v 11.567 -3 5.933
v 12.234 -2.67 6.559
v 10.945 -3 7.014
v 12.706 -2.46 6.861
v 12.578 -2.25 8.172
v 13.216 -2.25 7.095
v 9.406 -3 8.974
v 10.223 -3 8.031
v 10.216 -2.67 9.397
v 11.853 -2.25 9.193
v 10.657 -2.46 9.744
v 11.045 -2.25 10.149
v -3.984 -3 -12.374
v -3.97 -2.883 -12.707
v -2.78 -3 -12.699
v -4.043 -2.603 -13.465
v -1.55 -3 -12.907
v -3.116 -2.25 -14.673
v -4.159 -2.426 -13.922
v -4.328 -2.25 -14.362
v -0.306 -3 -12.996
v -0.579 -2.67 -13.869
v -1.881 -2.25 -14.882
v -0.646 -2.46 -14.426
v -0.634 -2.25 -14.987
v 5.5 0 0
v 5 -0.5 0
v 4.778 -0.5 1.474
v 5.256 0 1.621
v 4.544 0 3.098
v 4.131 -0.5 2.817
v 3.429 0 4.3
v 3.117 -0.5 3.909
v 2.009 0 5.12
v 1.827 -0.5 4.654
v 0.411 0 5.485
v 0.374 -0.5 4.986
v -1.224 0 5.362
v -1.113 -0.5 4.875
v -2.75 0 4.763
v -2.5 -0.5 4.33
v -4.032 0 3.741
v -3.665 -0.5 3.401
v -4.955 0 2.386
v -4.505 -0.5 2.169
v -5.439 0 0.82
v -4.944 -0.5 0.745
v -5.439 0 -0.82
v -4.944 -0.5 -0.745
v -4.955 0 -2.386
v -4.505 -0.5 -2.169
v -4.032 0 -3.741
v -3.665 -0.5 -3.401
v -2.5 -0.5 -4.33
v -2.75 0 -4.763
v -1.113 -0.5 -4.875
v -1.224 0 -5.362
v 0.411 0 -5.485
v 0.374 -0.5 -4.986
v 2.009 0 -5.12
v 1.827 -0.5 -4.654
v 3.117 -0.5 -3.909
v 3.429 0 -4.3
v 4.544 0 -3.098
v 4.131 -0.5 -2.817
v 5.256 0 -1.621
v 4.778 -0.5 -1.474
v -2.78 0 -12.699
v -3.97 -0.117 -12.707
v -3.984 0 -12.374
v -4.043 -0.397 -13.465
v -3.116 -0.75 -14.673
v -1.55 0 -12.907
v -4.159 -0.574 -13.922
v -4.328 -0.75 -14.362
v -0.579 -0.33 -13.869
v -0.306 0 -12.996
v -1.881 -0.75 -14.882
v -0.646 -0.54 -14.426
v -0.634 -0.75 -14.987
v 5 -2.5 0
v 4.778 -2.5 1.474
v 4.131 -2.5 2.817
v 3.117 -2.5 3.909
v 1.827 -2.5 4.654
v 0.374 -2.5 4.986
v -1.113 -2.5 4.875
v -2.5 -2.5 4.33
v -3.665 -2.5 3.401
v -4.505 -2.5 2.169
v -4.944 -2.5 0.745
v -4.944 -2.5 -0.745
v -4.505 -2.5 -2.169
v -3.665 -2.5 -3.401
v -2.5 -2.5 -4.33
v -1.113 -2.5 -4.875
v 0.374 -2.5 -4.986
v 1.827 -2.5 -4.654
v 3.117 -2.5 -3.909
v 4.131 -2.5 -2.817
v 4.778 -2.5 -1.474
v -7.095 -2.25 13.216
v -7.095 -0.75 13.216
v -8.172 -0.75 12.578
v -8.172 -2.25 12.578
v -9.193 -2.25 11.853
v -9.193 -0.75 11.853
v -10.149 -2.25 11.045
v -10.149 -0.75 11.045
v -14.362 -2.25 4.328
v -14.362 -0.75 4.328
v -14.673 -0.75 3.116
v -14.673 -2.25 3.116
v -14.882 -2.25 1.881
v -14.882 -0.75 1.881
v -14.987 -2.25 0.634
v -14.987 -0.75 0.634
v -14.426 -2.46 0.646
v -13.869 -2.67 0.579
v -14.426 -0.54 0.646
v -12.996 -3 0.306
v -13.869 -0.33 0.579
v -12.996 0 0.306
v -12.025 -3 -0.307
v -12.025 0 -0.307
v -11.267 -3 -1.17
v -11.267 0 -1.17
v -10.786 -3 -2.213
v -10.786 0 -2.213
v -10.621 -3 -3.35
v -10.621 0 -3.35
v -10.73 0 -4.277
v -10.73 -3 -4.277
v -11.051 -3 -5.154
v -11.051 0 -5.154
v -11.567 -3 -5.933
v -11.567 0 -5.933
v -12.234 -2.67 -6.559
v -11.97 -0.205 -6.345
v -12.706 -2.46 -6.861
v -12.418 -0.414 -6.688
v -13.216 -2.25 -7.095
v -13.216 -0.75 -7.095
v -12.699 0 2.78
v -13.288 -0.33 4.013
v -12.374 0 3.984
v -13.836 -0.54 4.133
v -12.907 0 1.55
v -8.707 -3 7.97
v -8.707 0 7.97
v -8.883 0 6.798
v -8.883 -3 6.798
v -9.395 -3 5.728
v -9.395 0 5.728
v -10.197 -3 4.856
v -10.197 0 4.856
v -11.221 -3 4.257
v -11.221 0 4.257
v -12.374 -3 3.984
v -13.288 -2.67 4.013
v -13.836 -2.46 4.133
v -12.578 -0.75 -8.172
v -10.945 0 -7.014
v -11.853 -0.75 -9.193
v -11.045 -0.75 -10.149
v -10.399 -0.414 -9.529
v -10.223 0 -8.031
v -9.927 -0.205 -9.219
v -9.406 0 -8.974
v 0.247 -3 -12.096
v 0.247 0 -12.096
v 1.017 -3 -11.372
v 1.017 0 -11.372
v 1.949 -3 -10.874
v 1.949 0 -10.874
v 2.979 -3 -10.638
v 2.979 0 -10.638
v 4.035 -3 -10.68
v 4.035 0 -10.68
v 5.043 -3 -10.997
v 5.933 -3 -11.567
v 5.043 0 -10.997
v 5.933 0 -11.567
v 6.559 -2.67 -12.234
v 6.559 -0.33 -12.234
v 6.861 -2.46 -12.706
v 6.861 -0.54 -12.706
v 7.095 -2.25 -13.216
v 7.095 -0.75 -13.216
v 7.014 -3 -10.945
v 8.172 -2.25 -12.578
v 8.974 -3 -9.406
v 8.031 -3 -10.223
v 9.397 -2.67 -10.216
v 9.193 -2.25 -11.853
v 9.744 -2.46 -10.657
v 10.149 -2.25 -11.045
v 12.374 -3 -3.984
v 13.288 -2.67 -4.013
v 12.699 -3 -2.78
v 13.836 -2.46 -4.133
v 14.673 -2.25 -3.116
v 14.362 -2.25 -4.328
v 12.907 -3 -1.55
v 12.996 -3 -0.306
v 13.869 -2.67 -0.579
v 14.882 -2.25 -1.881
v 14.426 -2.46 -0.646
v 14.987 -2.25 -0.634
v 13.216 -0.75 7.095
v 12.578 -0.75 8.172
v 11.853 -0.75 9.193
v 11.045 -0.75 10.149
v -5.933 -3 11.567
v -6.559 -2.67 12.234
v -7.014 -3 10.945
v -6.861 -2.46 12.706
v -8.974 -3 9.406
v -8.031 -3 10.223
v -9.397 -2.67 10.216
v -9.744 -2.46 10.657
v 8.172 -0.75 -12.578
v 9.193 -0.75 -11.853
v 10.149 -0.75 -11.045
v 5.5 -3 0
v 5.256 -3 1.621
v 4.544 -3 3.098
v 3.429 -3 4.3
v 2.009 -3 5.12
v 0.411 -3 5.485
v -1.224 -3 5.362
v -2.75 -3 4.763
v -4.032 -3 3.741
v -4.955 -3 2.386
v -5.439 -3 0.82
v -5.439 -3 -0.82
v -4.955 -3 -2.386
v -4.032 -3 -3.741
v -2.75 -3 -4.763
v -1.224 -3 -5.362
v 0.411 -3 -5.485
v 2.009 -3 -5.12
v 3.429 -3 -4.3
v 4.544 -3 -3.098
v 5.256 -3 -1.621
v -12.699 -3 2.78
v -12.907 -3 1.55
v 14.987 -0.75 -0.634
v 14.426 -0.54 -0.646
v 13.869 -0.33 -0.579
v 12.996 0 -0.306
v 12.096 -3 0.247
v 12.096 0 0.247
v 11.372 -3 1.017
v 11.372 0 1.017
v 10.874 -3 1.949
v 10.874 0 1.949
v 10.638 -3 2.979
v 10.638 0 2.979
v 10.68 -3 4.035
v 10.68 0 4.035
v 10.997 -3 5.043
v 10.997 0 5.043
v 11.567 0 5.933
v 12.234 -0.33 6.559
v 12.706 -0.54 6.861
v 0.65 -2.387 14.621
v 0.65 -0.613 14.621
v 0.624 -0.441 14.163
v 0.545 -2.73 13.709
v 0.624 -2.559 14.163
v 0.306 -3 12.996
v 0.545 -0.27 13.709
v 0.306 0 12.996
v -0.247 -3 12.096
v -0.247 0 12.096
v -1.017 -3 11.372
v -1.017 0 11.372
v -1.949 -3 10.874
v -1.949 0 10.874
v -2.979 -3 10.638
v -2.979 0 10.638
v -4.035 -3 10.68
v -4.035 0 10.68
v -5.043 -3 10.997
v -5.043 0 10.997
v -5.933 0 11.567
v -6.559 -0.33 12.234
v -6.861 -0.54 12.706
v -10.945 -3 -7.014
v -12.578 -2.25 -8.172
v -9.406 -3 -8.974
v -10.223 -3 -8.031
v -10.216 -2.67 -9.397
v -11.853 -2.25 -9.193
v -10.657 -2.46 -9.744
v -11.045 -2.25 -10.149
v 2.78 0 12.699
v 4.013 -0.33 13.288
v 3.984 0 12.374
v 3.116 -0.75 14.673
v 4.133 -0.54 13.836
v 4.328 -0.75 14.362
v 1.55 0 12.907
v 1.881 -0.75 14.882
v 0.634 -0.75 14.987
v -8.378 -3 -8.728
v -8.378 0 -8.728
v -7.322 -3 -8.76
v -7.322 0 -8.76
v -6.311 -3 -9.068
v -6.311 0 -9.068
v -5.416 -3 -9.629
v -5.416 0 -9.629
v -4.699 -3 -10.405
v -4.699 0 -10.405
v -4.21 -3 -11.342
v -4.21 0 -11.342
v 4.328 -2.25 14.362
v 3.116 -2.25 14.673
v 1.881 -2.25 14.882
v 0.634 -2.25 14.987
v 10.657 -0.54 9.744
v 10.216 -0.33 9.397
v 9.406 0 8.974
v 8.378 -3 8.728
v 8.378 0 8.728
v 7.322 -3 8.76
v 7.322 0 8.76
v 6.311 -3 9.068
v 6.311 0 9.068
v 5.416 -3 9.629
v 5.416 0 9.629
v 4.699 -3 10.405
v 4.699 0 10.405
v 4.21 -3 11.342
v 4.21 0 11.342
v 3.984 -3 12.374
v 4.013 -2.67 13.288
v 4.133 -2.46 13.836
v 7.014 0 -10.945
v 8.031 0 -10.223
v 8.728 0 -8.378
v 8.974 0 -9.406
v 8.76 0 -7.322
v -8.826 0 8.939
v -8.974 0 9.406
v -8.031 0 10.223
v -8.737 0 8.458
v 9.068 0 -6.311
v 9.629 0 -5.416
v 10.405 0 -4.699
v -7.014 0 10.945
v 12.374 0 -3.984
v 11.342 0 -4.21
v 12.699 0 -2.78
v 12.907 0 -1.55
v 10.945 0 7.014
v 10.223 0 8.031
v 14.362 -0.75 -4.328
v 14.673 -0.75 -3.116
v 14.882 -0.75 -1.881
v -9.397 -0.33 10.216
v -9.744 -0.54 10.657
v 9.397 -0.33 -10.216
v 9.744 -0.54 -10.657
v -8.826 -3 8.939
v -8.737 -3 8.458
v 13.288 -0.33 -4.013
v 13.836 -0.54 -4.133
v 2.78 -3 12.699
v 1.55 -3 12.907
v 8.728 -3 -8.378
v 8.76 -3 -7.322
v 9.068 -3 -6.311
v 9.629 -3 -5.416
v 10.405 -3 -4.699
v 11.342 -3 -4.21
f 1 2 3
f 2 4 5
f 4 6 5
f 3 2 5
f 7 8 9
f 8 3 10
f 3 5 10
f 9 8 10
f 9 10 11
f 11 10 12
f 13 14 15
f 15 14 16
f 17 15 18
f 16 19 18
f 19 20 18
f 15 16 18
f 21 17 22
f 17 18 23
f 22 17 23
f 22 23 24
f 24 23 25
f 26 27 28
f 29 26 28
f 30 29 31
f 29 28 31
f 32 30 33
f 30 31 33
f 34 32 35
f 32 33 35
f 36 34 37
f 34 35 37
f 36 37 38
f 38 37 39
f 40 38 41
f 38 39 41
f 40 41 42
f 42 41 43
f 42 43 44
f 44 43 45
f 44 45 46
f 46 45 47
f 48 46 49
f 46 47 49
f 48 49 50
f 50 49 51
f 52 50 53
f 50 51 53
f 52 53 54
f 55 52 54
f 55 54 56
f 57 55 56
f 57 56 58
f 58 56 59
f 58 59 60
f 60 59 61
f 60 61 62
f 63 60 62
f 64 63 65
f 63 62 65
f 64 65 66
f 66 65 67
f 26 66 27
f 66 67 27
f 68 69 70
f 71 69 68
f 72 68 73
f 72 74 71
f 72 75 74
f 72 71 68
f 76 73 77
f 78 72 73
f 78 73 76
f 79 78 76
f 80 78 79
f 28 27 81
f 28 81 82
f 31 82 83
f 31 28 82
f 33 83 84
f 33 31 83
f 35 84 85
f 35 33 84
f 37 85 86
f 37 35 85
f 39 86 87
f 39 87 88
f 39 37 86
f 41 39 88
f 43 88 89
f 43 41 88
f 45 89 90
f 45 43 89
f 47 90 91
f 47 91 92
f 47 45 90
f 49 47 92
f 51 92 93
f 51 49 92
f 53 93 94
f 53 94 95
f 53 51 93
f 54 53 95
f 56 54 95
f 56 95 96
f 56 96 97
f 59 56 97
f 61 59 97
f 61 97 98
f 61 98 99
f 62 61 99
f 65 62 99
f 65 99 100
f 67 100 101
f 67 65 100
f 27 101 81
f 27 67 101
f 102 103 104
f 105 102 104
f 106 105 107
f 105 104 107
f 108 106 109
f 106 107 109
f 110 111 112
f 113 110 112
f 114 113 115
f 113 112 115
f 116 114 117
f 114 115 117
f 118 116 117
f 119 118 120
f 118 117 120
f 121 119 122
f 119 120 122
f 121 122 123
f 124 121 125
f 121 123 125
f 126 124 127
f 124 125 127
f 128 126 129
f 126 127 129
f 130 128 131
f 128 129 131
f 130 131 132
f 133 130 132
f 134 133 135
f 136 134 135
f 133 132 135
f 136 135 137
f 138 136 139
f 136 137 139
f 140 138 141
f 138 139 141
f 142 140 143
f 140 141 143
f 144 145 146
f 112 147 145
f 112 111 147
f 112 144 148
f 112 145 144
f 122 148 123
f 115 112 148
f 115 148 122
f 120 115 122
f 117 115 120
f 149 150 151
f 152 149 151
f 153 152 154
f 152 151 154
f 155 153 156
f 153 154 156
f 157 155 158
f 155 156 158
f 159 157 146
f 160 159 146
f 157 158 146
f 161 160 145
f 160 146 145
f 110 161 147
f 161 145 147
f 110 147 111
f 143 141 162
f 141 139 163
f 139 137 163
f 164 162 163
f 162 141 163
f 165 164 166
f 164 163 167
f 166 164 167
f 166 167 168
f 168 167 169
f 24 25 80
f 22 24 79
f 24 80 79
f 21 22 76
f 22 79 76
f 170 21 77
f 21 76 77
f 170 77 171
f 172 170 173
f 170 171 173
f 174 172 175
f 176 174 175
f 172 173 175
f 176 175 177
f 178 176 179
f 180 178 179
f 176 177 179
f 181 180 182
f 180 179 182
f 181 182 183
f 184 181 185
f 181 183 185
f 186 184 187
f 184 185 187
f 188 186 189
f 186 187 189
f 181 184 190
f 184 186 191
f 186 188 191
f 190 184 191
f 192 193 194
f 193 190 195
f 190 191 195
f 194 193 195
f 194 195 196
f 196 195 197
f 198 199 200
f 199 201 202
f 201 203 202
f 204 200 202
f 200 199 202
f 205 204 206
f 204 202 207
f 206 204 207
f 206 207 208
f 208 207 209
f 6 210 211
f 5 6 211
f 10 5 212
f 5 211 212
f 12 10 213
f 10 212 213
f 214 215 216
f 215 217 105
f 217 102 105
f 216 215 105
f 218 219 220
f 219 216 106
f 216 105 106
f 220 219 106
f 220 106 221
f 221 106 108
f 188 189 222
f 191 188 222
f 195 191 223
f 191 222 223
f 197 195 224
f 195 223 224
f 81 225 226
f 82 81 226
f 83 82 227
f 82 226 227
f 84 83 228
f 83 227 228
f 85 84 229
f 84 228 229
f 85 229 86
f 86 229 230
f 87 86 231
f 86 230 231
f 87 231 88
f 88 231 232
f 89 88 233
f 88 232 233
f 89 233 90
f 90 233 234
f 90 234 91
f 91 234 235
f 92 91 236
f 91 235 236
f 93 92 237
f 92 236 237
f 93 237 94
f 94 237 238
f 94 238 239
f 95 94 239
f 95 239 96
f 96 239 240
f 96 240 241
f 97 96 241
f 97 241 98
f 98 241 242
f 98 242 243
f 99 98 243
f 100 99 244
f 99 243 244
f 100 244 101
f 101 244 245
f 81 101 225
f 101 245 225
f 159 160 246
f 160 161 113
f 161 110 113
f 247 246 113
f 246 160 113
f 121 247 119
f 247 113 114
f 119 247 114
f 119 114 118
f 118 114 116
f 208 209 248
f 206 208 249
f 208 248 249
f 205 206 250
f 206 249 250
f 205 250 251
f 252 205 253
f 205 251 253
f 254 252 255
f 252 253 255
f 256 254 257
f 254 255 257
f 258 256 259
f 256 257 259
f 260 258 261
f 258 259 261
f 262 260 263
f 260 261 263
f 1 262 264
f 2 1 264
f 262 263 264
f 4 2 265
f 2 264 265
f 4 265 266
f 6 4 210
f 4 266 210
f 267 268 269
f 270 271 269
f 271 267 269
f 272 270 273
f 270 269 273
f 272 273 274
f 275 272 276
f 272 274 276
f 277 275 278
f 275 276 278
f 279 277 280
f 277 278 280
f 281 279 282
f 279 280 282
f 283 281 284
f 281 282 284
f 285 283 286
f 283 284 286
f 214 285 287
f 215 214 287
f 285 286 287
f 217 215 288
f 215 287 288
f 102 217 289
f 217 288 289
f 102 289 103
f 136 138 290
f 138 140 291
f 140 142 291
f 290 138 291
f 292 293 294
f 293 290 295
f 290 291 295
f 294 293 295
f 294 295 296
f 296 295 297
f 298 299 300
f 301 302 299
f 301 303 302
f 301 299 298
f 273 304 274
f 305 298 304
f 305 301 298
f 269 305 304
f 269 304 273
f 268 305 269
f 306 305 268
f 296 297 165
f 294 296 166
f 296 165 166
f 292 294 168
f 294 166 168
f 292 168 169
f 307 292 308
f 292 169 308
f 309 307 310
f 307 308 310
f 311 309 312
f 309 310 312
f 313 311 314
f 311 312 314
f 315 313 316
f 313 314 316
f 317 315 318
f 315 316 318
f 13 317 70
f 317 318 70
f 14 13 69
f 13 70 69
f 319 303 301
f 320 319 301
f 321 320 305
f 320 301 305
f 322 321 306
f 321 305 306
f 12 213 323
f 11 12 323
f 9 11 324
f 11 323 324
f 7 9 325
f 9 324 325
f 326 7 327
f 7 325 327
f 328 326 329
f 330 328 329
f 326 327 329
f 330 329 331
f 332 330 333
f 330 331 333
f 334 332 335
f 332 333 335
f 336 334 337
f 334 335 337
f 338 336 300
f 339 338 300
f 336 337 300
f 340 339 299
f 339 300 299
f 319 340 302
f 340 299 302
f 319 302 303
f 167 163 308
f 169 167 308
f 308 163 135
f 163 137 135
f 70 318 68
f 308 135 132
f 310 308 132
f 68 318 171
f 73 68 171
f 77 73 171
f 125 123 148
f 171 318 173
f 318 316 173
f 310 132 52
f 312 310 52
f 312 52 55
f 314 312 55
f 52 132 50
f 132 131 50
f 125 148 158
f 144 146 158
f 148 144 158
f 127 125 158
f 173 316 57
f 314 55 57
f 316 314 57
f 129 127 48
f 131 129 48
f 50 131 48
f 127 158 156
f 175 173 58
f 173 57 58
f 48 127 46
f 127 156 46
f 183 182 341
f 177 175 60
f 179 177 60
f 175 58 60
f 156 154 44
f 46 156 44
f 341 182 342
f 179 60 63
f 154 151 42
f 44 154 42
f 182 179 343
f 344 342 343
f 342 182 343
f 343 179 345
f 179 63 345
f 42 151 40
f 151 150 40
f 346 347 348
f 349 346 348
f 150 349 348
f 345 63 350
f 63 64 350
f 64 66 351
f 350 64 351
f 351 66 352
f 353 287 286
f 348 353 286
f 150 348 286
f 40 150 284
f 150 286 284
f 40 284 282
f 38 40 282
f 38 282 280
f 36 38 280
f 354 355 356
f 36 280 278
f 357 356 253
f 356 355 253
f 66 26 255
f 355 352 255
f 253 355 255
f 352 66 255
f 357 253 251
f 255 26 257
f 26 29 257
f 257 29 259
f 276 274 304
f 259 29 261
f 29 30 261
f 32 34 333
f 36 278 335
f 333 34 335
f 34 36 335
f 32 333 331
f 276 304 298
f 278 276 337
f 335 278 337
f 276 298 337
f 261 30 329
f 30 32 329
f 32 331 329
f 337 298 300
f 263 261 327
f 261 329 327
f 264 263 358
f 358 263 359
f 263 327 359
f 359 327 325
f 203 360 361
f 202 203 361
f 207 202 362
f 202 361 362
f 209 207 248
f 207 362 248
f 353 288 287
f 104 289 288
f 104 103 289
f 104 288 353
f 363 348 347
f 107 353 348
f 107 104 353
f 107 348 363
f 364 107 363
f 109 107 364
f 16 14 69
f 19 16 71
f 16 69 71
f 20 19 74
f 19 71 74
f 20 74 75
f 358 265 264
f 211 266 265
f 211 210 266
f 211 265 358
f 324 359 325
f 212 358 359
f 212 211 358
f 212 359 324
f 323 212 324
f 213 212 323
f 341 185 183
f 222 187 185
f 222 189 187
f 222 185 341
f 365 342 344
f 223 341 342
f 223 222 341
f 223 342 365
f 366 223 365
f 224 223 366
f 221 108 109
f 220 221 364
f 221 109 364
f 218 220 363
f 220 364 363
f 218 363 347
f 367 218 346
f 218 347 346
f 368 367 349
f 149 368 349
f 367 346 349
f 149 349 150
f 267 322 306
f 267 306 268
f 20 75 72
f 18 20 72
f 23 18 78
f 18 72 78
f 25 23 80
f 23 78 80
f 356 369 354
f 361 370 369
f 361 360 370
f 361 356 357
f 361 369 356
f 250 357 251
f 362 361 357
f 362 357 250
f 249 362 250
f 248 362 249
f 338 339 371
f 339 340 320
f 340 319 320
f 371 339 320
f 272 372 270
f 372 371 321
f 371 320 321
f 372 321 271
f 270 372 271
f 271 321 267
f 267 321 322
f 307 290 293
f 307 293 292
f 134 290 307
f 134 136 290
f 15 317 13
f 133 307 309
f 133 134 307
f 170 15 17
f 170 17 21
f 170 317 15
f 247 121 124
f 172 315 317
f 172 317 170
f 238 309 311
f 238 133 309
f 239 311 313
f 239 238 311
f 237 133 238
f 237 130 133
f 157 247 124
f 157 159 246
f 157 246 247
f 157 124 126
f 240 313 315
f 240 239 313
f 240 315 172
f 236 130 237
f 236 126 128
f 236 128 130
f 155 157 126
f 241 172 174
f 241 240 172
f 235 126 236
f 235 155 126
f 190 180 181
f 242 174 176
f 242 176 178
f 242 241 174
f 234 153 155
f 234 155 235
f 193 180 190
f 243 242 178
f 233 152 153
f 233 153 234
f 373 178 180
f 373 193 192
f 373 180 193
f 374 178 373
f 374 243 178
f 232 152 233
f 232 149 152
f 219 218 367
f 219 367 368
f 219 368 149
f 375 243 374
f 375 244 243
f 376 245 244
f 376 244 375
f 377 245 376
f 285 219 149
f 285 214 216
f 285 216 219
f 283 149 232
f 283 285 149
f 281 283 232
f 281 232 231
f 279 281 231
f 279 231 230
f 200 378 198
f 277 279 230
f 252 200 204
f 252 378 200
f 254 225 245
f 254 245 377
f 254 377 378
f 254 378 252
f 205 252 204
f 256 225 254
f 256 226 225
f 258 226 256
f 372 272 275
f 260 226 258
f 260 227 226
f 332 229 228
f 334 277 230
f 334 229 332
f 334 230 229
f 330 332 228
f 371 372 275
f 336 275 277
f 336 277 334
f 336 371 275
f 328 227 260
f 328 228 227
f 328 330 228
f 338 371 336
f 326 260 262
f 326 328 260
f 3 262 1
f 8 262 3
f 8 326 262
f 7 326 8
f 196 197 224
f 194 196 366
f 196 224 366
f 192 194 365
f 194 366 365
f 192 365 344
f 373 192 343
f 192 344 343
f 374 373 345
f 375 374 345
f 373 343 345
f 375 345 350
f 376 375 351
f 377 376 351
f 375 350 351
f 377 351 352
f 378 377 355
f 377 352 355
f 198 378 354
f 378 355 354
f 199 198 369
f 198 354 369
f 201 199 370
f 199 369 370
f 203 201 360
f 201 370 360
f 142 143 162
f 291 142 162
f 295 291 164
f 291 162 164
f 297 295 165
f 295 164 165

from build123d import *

# Parameters (mm, degrees)
F0_R         = 5
F1_DEPTH     = 3
F2_C1_SIZE2  = 0.75
F2_C1_SIZE   = 2
F2_C2_SIZE2  = 0.75
F2_C2_SIZE   = 2
F2_C3_SIZE2  = 0.75
F2_C3_SIZE   = 2
F2_C4_SIZE2  = 0.75
F2_C4_SIZE   = 2
F2_C5_SIZE2  = 0.75
F2_C5_SIZE   = 2
F2_C6_SIZE2  = 0.75
F2_C6_SIZE   = 2
F2_C7_SIZE2  = 0.75
F2_C7_SIZE   = 2
F2_C8_SIZE2  = 0.75
F2_C8_SIZE   = 2
F2_C9_SIZE2  = 2
F2_C9_SIZE   = 0.75
F2_C10_SIZE2 = 0.75
F2_C10_SIZE  = 2
F2_C11_SIZE2 = 0.75
F2_C11_SIZE  = 2
F2_C12_SIZE2 = 0.75
F2_C12_SIZE  = 2
F2_C13_SIZE2 = 0.75
F2_C13_SIZE  = 2
F2_C14_SIZE2 = 0.75
F2_C14_SIZE  = 2
F2_C15_SIZE2 = 0.75
F2_C15_SIZE  = 2
F2_C16_SIZE2 = 0.75
F2_C16_SIZE  = 2
F4_SIZE      = 0.5


# Not quite as in the source:
# - two fillets or chamfers of one size are made in one step


with BuildPart() as f1:
    # F0 (on Front) → F1 (new body)
    with BuildSketch(Plane.XZ):
        with BuildLine():
            ThreePointArc((14.98661002, -0.6336561441), (10.7222272749, 2.4563880526), (13.2160968729, 7.0947010823))
            ThreePointArc((13.2160968729, 7.0947010823), (12.2264008787, 8.6899437025), (11.0451961285, 10.1490710157))
            ThreePointArc((11.0451961285, 10.1490710157), (5.8448309663, 9.3186882647), (4.3284804738, 14.3619029654))
            ThreePointArc((4.3284804738, 14.3619029654), (2.5006528507, 14.790089091), (0.6336561441, 14.98661002))
            ThreePointArc((0.6336561441, 14.98661002), (0.6461967949, 14.8041057756), (0.6503799283, 14.6212190113))
            ThreePointArc((0.6503799283, 14.6212190113), (-2.6355906754, 10.6854646971), (-7.0947010823, 13.2160968729))
            ThreePointArc((-7.0947010823, 13.2160968729), (-8.6899437025, 12.2264008787), (-10.1490710157, 11.0451961285))
            ThreePointArc((-10.1490710157, 11.0451961285), (-9.0856364951, 9.6683222969), (-8.7073021792, 7.970224045))
            ThreePointArc((-8.7073021792, 7.970224045), (-10.5414770644, 4.6073084094), (-14.3619029654, 4.3284804738))
            ThreePointArc((-14.3619029654, 4.3284804738), (-14.790089091, 2.5006528507), (-14.98661002, 0.6336561441))
            ThreePointArc((-14.98661002, 0.6336561441), (-11.9250702797, -0.3948303977), (-10.6212190113, -3.3496200717))
            ThreePointArc((-10.6212190113, -3.3496200717), (-11.3333254186, -5.6277236082), (-13.2160968729, -7.0947010823))
            ThreePointArc((-13.2160968729, -7.0947010823), (-12.2264008787, -8.6899437025), (-11.0451961285, -10.1490710157))
            ThreePointArc((-11.0451961285, -10.1490710157), (-6.6100564697, -8.9456610257), (-3.970224045, -12.7073021792))
            ThreePointArc((-3.970224045, -12.7073021792), (-4.060813969, -13.5537730042), (-4.3284804738, -14.3619029654))
            ThreePointArc((-4.3284804738, -14.3619029654), (-2.5006528507, -14.790089091), (-0.6336561441, -14.98661002))
            ThreePointArc((-0.6336561441, -14.98661002), (2.4563880526, -10.7222272749), (7.0947010823, -13.2160968729))
            ThreePointArc((7.0947010823, -13.2160968729), (8.6899437025, -12.2264008787), (10.1490710157, -11.0451961285))
            ThreePointArc((10.1490710157, -11.0451961285), (9.3186882647, -5.8448309663), (14.3619029654, -4.3284804738))
            ThreePointArc((14.3619029654, -4.3284804738), (14.790089091, -2.5006528507), (14.98661002, -0.6336561441))
        make_face()
        Circle(F0_R, mode=Mode.SUBTRACT)
    extrude(amount=F1_DEPTH)

    # F2: chamfer of 2 x 0.75 on 16 edges, made by hand

    # F2_c1
    f2_c1_edges = [f1.edges().sort_by_distance(p)[0] for p in [
        (8.6899437025, -3, -12.2264008787),
    ]]
    f2_c1_side = f1.faces().sort_by_distance((8.6812537588, -3, -12.2141744779))[0]
    chamfer(f2_c1_edges, length=F2_C1_SIZE, length2=F2_C1_SIZE2, reference=f2_c1_side)

    # F2_c2
    f2_c2_edges = [f1.edges().sort_by_distance(p)[0] for p in [
        (14.790089091, -3, -2.5006528507),
    ]]
    f2_c2_side = f1.faces().sort_by_distance((14.7752990019, -3, -2.4981521978))[0]
    chamfer(f2_c2_edges, length=F2_C2_SIZE, length2=F2_C2_SIZE2, reference=f2_c2_side)

    # F2_c3
    f2_c3_edges = [f1.edges().sort_by_distance(p)[0] for p in [
        (12.2264008787, -3, 8.6899437025),
    ]]
    f2_c3_side = f1.faces().sort_by_distance((12.2141744779, -3, 8.6812537588))[0]
    chamfer(f2_c3_edges, length=F2_C3_SIZE, length2=F2_C3_SIZE2, reference=f2_c3_side)

    # F2_c4
    f2_c4_edges = [f1.edges().sort_by_distance(p)[0] for p in [
        (2.5006528507, -3, 14.790089091),
    ]]
    f2_c4_side = f1.faces().sort_by_distance((2.4981521978, -3, 14.7752990019))[0]
    chamfer(f2_c4_edges, length=F2_C4_SIZE, length2=F2_C4_SIZE2, reference=f2_c4_side)

    # F2_c5
    f2_c5_edges = [f1.edges().sort_by_distance(p)[0] for p in [
        (-8.6899437025, -3, 12.2264008787),
    ]]
    f2_c5_side = f1.faces().sort_by_distance((-8.6812537588, -3, 12.2141744779))[0]
    chamfer(f2_c5_edges, length=F2_C5_SIZE, length2=F2_C5_SIZE2, reference=f2_c5_side)

    # F2_c6
    f2_c6_edges = [f1.edges().sort_by_distance(p)[0] for p in [
        (-14.790089091, -3, 2.5006528507),
    ]]
    f2_c6_side = f1.faces().sort_by_distance((-14.7752990019, -3, 2.4981521978))[0]
    chamfer(f2_c6_edges, length=F2_C6_SIZE, length2=F2_C6_SIZE2, reference=f2_c6_side)

    # F2_c7
    f2_c7_edges = [f1.edges().sort_by_distance(p)[0] for p in [
        (-12.2264008787, -3, -8.6899437025),
    ]]
    f2_c7_side = f1.faces().sort_by_distance((-12.2141744779, -3, -8.6812537588))[0]
    chamfer(f2_c7_edges, length=F2_C7_SIZE, length2=F2_C7_SIZE2, reference=f2_c7_side)

    # F2_c8
    f2_c8_edges = [f1.edges().sort_by_distance(p)[0] for p in [
        (-2.5006528507, -3, -14.790089091),
    ]]
    f2_c8_side = f1.faces().sort_by_distance((-2.4981521978, -3, -14.7752990019))[0]
    chamfer(f2_c8_edges, length=F2_C8_SIZE, length2=F2_C8_SIZE2, reference=f2_c8_side)

    # F2_c9
    f2_c9_edges = [f1.edges().sort_by_distance(p)[0] for p in [
        (-12.2264008787, 0, -8.6899437025),
    ]]
    f2_c9_side = f1.faces().sort_by_distance((-12.2264008787, -0.015, -8.6899437025))[0]
    chamfer(f2_c9_edges, length=F2_C9_SIZE, length2=F2_C9_SIZE2, reference=f2_c9_side)

    # F2_c10
    f2_c10_edges = [f1.edges().sort_by_distance(p)[0] for p in [
        (-14.790089091, 0, 2.5006528507),
    ]]
    f2_c10_side = f1.faces().sort_by_distance((-14.7752990019, 0, 2.4981521978))[0]
    chamfer(f2_c10_edges, length=F2_C10_SIZE, length2=F2_C10_SIZE2, reference=f2_c10_side)

    # F2_c11
    f2_c11_edges = [f1.edges().sort_by_distance(p)[0] for p in [
        (-8.6899437025, 0, 12.2264008787),
    ]]
    f2_c11_side = f1.faces().sort_by_distance((-8.6812537588, 0, 12.2141744779))[0]
    chamfer(f2_c11_edges, length=F2_C11_SIZE, length2=F2_C11_SIZE2, reference=f2_c11_side)

    # F2_c12
    f2_c12_edges = [f1.edges().sort_by_distance(p)[0] for p in [
        (2.5006528507, 0, 14.790089091),
    ]]
    f2_c12_side = f1.faces().sort_by_distance((2.4981521978, 0, 14.7752990019))[0]
    chamfer(f2_c12_edges, length=F2_C12_SIZE, length2=F2_C12_SIZE2, reference=f2_c12_side)

    # F2_c13
    f2_c13_edges = [f1.edges().sort_by_distance(p)[0] for p in [
        (12.2264008787, 0, 8.6899437025),
    ]]
    f2_c13_side = f1.faces().sort_by_distance((12.2141744779, 0, 8.6812537588))[0]
    chamfer(f2_c13_edges, length=F2_C13_SIZE, length2=F2_C13_SIZE2, reference=f2_c13_side)

    # F2_c14
    f2_c14_edges = [f1.edges().sort_by_distance(p)[0] for p in [
        (14.790089091, 0, -2.5006528507),
    ]]
    f2_c14_side = f1.faces().sort_by_distance((14.7752990019, 0, -2.4981521978))[0]
    chamfer(f2_c14_edges, length=F2_C14_SIZE, length2=F2_C14_SIZE2, reference=f2_c14_side)

    # F2_c15
    f2_c15_edges = [f1.edges().sort_by_distance(p)[0] for p in [
        (8.6899437025, 0, -12.2264008787),
    ]]
    f2_c15_side = f1.faces().sort_by_distance((8.6812537588, 0, -12.2141744779))[0]
    chamfer(f2_c15_edges, length=F2_C15_SIZE, length2=F2_C15_SIZE2, reference=f2_c15_side)

    # F2_c16
    f2_c16_edges = [f1.edges().sort_by_distance(p)[0] for p in [
        (-2.5006528507, 0, -14.790089091),
    ]]
    f2_c16_side = f1.faces().sort_by_distance((-2.4981521978, 0, -14.7752990019))[0]
    chamfer(f2_c16_edges, length=F2_C16_SIZE, length2=F2_C16_SIZE2, reference=f2_c16_side)

    # F4
    f4_edges = [f1.edges().sort_by_distance(p)[0] for p in [
        (-5, -3, 0),
        (-5, 0, 0),
    ]]
    chamfer(f4_edges, length=F4_SIZE)


solid = f1.part
